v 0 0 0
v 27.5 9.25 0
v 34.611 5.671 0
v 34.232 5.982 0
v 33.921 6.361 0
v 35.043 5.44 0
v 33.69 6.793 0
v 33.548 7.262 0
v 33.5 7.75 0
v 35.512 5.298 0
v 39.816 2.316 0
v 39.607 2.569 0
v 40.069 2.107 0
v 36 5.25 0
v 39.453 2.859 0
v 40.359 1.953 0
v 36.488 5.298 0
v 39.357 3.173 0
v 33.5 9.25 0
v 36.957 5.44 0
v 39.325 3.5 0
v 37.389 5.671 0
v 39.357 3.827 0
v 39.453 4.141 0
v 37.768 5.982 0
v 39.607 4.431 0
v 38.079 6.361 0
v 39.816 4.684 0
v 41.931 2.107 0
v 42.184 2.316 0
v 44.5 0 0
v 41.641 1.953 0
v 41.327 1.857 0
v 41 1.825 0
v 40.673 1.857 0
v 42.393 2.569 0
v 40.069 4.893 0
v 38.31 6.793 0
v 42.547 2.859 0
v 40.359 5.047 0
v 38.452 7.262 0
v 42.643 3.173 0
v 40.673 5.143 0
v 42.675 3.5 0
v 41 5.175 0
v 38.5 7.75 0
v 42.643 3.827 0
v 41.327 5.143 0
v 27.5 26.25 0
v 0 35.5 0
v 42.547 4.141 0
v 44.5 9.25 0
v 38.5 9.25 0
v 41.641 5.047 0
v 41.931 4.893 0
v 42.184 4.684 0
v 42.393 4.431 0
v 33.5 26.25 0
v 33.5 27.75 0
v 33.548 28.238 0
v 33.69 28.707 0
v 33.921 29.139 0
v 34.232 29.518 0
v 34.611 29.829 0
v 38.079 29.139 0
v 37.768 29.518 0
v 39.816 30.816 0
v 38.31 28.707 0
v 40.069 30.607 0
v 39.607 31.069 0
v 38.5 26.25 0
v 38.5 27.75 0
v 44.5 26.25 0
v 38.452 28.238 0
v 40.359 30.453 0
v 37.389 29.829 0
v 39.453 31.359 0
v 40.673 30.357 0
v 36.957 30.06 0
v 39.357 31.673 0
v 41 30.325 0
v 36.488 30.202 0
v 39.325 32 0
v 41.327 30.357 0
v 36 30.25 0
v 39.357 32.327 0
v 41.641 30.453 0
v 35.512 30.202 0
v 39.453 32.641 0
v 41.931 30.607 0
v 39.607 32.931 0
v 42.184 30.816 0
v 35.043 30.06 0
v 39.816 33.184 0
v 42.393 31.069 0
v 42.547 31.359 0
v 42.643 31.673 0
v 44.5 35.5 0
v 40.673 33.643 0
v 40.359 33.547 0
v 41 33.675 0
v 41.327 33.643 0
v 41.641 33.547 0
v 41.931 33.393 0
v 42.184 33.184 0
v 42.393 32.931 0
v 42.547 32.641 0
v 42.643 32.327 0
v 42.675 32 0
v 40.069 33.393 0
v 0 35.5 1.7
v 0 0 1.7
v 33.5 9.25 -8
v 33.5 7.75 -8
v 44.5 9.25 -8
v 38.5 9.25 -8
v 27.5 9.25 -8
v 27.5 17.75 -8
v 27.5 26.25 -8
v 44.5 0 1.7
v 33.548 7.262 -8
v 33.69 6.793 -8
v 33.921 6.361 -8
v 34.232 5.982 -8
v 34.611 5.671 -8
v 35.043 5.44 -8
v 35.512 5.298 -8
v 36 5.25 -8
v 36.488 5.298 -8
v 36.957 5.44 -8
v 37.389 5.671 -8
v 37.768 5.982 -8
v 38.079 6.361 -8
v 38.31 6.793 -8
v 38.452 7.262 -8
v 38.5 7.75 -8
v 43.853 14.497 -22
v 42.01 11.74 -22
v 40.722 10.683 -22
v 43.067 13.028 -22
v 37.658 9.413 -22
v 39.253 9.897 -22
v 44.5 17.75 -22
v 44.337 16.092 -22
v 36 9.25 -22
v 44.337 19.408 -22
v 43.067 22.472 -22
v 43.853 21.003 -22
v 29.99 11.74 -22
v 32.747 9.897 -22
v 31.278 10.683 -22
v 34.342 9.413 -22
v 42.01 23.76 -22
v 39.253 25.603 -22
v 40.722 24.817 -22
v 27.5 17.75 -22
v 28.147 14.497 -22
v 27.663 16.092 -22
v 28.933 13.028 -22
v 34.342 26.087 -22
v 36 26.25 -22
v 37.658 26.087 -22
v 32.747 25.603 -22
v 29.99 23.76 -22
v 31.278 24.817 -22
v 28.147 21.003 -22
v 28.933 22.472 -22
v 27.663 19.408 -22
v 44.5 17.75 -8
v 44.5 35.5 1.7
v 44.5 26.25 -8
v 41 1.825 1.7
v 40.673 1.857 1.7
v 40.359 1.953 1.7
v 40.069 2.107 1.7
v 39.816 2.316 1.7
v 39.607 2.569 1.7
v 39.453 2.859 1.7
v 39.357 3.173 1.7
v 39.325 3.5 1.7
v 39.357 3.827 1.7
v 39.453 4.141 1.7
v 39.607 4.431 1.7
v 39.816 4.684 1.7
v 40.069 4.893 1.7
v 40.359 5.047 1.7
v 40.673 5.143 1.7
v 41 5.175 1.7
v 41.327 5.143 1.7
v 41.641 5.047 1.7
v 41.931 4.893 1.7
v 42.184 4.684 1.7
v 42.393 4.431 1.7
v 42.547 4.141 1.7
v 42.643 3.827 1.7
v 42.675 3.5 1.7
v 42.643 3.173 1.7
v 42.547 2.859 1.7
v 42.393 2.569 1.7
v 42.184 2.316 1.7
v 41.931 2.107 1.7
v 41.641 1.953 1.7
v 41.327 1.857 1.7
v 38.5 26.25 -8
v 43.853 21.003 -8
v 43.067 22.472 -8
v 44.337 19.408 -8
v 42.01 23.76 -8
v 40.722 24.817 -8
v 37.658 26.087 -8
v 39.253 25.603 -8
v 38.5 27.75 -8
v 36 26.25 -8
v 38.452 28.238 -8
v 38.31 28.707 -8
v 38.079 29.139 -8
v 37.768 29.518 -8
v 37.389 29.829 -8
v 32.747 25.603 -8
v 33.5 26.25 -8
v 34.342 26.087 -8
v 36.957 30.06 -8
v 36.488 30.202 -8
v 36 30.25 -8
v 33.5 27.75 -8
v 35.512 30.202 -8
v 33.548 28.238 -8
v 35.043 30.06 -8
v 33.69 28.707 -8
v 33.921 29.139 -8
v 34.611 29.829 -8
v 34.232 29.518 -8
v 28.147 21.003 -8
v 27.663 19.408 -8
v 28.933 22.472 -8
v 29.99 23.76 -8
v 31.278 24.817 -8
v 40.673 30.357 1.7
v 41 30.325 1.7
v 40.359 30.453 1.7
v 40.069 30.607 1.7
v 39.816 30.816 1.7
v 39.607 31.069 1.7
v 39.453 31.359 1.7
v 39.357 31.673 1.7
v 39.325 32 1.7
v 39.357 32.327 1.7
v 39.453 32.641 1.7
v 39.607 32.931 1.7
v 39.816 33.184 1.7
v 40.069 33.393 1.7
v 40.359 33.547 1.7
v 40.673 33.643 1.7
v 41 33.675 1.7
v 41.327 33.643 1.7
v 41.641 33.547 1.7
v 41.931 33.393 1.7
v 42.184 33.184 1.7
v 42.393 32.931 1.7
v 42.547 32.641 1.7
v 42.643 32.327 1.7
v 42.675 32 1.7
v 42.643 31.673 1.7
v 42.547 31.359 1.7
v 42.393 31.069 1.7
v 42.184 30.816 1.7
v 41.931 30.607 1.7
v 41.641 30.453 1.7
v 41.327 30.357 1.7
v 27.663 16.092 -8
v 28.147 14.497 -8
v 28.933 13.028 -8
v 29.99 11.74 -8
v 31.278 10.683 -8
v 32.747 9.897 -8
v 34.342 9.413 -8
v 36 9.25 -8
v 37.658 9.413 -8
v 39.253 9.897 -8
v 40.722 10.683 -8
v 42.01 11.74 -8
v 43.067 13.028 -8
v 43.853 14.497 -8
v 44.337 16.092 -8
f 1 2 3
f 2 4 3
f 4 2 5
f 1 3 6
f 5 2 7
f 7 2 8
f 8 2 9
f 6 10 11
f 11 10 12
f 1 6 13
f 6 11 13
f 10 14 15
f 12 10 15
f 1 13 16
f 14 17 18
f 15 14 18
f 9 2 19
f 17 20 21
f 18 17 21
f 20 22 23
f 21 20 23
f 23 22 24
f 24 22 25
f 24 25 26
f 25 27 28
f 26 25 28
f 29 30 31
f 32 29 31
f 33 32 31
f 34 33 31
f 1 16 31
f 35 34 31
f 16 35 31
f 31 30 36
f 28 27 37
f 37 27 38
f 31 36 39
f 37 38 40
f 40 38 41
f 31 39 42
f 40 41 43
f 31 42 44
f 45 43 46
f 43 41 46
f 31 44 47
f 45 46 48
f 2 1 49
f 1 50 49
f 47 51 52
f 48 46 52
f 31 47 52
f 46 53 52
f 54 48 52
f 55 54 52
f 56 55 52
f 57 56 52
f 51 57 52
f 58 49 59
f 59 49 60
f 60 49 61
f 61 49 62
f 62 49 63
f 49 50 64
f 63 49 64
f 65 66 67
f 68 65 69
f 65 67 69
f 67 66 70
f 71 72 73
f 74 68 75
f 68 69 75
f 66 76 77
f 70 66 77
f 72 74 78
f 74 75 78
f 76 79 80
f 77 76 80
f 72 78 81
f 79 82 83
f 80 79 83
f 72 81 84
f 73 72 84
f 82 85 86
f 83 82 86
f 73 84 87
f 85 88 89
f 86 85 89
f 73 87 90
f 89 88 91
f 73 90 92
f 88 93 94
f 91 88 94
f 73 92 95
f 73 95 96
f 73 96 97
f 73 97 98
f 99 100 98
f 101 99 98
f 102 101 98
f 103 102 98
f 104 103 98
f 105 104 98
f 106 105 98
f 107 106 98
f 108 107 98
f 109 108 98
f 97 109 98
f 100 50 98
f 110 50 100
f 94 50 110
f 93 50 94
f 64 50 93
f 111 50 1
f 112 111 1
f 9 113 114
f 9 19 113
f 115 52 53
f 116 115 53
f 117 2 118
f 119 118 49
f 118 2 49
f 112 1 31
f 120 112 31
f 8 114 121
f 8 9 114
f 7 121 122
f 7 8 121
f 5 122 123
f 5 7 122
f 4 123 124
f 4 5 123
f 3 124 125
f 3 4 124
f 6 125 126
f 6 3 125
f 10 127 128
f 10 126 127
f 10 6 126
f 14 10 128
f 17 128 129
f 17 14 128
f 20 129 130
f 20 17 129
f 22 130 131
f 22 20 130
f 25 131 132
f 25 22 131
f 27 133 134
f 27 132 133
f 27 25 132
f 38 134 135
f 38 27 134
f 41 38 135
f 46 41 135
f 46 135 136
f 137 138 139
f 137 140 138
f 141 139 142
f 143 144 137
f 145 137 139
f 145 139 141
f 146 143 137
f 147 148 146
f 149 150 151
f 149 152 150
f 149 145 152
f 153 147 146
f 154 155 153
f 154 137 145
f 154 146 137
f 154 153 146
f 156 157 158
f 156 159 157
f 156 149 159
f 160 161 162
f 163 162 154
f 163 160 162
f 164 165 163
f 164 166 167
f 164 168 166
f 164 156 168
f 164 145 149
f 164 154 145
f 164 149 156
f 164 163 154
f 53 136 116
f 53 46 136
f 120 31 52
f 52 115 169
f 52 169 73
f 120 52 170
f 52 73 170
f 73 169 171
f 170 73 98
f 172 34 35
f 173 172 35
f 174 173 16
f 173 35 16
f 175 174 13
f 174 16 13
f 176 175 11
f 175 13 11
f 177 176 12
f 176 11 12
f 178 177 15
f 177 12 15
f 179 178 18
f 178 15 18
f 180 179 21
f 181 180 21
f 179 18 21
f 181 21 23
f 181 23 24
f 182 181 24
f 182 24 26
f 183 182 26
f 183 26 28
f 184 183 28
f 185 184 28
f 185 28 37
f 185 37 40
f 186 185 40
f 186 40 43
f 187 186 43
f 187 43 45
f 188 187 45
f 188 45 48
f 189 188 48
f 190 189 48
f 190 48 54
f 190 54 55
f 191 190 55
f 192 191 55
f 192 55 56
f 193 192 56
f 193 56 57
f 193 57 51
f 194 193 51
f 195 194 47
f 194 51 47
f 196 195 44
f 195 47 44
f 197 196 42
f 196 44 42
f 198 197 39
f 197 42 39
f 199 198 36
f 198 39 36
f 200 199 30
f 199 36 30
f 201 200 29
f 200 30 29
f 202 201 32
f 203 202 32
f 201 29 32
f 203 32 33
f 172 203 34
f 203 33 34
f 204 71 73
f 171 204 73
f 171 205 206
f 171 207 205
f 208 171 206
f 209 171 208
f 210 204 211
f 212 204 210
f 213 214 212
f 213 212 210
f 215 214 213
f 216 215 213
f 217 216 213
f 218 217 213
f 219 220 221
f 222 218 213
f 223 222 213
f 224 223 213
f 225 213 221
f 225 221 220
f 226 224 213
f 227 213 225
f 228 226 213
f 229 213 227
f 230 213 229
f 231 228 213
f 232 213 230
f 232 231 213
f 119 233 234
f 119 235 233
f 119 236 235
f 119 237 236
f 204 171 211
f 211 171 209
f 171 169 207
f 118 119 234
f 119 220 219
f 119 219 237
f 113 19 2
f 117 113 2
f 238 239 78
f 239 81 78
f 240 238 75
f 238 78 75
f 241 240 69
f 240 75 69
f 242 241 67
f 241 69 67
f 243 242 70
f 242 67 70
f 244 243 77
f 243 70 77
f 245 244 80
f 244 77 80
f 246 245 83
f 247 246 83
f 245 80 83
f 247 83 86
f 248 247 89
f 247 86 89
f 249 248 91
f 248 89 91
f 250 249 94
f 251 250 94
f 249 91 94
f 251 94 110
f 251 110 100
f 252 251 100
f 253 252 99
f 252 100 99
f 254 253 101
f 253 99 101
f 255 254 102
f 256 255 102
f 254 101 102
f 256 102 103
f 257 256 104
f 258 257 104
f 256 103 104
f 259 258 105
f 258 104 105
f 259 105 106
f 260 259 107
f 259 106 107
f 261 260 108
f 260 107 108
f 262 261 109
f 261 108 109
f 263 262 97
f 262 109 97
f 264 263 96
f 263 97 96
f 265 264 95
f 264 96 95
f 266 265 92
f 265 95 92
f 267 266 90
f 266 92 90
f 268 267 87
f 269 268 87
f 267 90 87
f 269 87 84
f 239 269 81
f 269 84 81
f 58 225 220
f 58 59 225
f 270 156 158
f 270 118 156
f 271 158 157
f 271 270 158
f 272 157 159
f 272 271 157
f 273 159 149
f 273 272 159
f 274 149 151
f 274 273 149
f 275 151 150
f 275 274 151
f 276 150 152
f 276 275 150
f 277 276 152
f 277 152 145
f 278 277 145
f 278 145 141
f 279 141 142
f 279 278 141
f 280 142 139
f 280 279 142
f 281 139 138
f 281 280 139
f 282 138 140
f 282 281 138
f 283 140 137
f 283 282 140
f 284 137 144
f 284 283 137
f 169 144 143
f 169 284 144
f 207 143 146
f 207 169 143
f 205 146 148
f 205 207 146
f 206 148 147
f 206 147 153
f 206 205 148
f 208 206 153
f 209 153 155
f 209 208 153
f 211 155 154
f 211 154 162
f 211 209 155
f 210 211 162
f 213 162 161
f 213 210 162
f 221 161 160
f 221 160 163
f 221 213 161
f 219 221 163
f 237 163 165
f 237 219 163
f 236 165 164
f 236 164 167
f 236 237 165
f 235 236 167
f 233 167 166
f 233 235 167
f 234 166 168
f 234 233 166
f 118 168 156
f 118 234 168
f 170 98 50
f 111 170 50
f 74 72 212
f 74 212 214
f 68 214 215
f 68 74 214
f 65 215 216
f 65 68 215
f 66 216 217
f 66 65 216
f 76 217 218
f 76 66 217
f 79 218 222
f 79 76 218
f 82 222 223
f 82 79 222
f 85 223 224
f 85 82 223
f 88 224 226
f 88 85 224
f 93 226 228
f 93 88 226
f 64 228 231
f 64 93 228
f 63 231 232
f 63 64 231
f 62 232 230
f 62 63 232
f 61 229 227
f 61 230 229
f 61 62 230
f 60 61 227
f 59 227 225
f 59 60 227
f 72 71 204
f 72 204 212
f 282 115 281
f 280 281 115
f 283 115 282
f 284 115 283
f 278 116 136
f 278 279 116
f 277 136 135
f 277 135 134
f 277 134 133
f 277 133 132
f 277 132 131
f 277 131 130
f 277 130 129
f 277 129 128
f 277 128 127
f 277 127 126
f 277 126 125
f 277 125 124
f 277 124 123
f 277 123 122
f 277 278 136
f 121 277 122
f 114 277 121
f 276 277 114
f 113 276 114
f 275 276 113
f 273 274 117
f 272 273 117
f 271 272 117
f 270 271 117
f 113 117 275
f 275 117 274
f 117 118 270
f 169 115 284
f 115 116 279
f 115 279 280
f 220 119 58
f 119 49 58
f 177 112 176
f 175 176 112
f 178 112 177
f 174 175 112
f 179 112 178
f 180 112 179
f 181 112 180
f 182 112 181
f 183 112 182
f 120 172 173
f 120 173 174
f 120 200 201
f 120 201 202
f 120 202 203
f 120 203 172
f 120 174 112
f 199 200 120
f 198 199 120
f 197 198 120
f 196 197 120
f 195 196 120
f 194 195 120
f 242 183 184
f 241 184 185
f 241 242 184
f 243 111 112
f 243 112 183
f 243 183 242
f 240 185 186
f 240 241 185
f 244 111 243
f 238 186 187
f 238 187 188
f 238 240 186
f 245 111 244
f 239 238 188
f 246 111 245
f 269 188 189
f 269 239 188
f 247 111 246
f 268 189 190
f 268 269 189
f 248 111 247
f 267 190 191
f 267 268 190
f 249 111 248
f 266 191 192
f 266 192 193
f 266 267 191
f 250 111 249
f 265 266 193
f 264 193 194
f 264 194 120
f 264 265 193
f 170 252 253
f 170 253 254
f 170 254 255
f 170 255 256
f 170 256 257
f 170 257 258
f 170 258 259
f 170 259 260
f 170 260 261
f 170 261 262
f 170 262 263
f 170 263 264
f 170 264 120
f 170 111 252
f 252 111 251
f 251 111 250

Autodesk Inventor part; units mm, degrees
ref_plane "YZ Plane" through (0, 0, 0) normal (1, 0, 0) x (0, 1, 0)
ref_plane "XZ Plane" through (0, 0, 0) normal (0, 1, 0) x (-1, 0, 0)
ref_plane "XY Plane" through (0, 0, 0) normal (0, 0, 1) x (1, 0, 0)
sketch "Эскиз1" plane through (0, 0, 0) normal (0, 0, 1) x (1, 0, 0)
  line L0 (0, 0) -> (44.5, 0)
  line L1 (44.5, 0) -> (44.5, 35.5)
  line L2 (44.5, 35.5) -> (0, 35.5)
  line L3 (0, 35.5) -> (0, 0)
  dimension "d0" = 44.5
  dimension "d1" = 35.5
extrude "Выдавливание1" add sketch "Эскиз1" along normal blind 1.7
sketch "Эскиз2" plane through (0, 0, 1.7) normal (0, 0, 1) x (1, 0, 0)
  line L0 (0, 0) -> (44.5, 0) projected
  line L1 (44.5, 0) -> (44.5, 3.5)
  line L2 (44.5, 0) -> (44.5, 35.5) projected
  line L3 (44.5, 3.5) -> (41, 3.5)
  line L4 (44.5, 35.5) -> (44.5, 32)
  line L5 (44.5, 32) -> (41, 32)
  dimension "d4" = 3.5
  dimension "d5" = 3.5
  dimension "d6" = 3.5
  dimension "d7" = 3.5
hole "Отверстие1" at (41, 32, 1.7) at (41, 3.5, 1.7) direction (0, 0, -1) diameter 3.35 depth 15
sketch "Эскиз3" plane through (0, 0, 0) normal (0, 0, -1) x (-1, 0, 0)
  line L0 (-44.5, 0) -> (-44.5, 35.5) projected
  line L1 (-44.5, 0) -> (-44.5, 9.25)
  line L2 (-44.5, 9.25) -> (-27.5, 9.25)
  line L3 (-27.5, 9.25) -> (-27.5, 26.25)
  line L4 (-27.5, 26.25) -> (-44.5, 26.25)
  line L5 (-44.5, 26.25) -> (-44.5, 9.25)
  line L6 (-36, 26.25) -> (-36, 27.75)
  line L7 (-36, 9.25) -> (-36, 7.75)
  circle A0 centre (-36, 7.75) radius 2.5
  circle A1 centre (-36, 27.75) radius 2.5
  line L8 (-38.5, 27.75) -> (-33.5, 27.75)
  line L9 (-33.5, 27.75) -> (-33.5, 26.25)
  line L10 (-33.5, 26.25) -> (-38.5, 26.25)
  line L11 (-38.5, 26.25) -> (-38.5, 27.75)
  line L12 (-33.5, 7.75) -> (-38.5, 7.75)
  line L13 (-38.5, 7.75) -> (-38.5, 9.25)
  line L14 (-38.5, 9.25) -> (-33.5, 9.25)
  line L15 (-33.5, 9.25) -> (-33.5, 7.75)
  point P0 (0, 0)
  dimension "d20" = 5
  dimension "d21" = 5
  dimension "d15" = 9.25
  dimension "d16" = 17
  dimension "d17" = 17
  dimension "d18" = 1.5
  dimension "d19" = 1.5
extrude "Выдавливание2" add sketch "Эскиз3" along normal blind 8
sketch "Эскиз4" plane through (0, 0, -8) normal (0, 0, -1) x (-1, 0, 0)
  line L0 (-44.5, 0) -> (-44.5, 35.5) projected
  line L1 (-44.5, 17.75) -> (-27.5, 17.75)
  line L2 (-27.5, 26.25) -> (-27.5, 9.25) projected
  circle A0 centre (-36, 17.75) radius 8.5
  point P0 (0, 0)
extrude "Выдавливание3" add sketch "Эскиз4" along normal blind 14
equation "\"d4\" = d6"
equation "\"d5\" = d6"
equation "\"d7\" = d6"
properties part number "Техническое зрение OpenMV"
